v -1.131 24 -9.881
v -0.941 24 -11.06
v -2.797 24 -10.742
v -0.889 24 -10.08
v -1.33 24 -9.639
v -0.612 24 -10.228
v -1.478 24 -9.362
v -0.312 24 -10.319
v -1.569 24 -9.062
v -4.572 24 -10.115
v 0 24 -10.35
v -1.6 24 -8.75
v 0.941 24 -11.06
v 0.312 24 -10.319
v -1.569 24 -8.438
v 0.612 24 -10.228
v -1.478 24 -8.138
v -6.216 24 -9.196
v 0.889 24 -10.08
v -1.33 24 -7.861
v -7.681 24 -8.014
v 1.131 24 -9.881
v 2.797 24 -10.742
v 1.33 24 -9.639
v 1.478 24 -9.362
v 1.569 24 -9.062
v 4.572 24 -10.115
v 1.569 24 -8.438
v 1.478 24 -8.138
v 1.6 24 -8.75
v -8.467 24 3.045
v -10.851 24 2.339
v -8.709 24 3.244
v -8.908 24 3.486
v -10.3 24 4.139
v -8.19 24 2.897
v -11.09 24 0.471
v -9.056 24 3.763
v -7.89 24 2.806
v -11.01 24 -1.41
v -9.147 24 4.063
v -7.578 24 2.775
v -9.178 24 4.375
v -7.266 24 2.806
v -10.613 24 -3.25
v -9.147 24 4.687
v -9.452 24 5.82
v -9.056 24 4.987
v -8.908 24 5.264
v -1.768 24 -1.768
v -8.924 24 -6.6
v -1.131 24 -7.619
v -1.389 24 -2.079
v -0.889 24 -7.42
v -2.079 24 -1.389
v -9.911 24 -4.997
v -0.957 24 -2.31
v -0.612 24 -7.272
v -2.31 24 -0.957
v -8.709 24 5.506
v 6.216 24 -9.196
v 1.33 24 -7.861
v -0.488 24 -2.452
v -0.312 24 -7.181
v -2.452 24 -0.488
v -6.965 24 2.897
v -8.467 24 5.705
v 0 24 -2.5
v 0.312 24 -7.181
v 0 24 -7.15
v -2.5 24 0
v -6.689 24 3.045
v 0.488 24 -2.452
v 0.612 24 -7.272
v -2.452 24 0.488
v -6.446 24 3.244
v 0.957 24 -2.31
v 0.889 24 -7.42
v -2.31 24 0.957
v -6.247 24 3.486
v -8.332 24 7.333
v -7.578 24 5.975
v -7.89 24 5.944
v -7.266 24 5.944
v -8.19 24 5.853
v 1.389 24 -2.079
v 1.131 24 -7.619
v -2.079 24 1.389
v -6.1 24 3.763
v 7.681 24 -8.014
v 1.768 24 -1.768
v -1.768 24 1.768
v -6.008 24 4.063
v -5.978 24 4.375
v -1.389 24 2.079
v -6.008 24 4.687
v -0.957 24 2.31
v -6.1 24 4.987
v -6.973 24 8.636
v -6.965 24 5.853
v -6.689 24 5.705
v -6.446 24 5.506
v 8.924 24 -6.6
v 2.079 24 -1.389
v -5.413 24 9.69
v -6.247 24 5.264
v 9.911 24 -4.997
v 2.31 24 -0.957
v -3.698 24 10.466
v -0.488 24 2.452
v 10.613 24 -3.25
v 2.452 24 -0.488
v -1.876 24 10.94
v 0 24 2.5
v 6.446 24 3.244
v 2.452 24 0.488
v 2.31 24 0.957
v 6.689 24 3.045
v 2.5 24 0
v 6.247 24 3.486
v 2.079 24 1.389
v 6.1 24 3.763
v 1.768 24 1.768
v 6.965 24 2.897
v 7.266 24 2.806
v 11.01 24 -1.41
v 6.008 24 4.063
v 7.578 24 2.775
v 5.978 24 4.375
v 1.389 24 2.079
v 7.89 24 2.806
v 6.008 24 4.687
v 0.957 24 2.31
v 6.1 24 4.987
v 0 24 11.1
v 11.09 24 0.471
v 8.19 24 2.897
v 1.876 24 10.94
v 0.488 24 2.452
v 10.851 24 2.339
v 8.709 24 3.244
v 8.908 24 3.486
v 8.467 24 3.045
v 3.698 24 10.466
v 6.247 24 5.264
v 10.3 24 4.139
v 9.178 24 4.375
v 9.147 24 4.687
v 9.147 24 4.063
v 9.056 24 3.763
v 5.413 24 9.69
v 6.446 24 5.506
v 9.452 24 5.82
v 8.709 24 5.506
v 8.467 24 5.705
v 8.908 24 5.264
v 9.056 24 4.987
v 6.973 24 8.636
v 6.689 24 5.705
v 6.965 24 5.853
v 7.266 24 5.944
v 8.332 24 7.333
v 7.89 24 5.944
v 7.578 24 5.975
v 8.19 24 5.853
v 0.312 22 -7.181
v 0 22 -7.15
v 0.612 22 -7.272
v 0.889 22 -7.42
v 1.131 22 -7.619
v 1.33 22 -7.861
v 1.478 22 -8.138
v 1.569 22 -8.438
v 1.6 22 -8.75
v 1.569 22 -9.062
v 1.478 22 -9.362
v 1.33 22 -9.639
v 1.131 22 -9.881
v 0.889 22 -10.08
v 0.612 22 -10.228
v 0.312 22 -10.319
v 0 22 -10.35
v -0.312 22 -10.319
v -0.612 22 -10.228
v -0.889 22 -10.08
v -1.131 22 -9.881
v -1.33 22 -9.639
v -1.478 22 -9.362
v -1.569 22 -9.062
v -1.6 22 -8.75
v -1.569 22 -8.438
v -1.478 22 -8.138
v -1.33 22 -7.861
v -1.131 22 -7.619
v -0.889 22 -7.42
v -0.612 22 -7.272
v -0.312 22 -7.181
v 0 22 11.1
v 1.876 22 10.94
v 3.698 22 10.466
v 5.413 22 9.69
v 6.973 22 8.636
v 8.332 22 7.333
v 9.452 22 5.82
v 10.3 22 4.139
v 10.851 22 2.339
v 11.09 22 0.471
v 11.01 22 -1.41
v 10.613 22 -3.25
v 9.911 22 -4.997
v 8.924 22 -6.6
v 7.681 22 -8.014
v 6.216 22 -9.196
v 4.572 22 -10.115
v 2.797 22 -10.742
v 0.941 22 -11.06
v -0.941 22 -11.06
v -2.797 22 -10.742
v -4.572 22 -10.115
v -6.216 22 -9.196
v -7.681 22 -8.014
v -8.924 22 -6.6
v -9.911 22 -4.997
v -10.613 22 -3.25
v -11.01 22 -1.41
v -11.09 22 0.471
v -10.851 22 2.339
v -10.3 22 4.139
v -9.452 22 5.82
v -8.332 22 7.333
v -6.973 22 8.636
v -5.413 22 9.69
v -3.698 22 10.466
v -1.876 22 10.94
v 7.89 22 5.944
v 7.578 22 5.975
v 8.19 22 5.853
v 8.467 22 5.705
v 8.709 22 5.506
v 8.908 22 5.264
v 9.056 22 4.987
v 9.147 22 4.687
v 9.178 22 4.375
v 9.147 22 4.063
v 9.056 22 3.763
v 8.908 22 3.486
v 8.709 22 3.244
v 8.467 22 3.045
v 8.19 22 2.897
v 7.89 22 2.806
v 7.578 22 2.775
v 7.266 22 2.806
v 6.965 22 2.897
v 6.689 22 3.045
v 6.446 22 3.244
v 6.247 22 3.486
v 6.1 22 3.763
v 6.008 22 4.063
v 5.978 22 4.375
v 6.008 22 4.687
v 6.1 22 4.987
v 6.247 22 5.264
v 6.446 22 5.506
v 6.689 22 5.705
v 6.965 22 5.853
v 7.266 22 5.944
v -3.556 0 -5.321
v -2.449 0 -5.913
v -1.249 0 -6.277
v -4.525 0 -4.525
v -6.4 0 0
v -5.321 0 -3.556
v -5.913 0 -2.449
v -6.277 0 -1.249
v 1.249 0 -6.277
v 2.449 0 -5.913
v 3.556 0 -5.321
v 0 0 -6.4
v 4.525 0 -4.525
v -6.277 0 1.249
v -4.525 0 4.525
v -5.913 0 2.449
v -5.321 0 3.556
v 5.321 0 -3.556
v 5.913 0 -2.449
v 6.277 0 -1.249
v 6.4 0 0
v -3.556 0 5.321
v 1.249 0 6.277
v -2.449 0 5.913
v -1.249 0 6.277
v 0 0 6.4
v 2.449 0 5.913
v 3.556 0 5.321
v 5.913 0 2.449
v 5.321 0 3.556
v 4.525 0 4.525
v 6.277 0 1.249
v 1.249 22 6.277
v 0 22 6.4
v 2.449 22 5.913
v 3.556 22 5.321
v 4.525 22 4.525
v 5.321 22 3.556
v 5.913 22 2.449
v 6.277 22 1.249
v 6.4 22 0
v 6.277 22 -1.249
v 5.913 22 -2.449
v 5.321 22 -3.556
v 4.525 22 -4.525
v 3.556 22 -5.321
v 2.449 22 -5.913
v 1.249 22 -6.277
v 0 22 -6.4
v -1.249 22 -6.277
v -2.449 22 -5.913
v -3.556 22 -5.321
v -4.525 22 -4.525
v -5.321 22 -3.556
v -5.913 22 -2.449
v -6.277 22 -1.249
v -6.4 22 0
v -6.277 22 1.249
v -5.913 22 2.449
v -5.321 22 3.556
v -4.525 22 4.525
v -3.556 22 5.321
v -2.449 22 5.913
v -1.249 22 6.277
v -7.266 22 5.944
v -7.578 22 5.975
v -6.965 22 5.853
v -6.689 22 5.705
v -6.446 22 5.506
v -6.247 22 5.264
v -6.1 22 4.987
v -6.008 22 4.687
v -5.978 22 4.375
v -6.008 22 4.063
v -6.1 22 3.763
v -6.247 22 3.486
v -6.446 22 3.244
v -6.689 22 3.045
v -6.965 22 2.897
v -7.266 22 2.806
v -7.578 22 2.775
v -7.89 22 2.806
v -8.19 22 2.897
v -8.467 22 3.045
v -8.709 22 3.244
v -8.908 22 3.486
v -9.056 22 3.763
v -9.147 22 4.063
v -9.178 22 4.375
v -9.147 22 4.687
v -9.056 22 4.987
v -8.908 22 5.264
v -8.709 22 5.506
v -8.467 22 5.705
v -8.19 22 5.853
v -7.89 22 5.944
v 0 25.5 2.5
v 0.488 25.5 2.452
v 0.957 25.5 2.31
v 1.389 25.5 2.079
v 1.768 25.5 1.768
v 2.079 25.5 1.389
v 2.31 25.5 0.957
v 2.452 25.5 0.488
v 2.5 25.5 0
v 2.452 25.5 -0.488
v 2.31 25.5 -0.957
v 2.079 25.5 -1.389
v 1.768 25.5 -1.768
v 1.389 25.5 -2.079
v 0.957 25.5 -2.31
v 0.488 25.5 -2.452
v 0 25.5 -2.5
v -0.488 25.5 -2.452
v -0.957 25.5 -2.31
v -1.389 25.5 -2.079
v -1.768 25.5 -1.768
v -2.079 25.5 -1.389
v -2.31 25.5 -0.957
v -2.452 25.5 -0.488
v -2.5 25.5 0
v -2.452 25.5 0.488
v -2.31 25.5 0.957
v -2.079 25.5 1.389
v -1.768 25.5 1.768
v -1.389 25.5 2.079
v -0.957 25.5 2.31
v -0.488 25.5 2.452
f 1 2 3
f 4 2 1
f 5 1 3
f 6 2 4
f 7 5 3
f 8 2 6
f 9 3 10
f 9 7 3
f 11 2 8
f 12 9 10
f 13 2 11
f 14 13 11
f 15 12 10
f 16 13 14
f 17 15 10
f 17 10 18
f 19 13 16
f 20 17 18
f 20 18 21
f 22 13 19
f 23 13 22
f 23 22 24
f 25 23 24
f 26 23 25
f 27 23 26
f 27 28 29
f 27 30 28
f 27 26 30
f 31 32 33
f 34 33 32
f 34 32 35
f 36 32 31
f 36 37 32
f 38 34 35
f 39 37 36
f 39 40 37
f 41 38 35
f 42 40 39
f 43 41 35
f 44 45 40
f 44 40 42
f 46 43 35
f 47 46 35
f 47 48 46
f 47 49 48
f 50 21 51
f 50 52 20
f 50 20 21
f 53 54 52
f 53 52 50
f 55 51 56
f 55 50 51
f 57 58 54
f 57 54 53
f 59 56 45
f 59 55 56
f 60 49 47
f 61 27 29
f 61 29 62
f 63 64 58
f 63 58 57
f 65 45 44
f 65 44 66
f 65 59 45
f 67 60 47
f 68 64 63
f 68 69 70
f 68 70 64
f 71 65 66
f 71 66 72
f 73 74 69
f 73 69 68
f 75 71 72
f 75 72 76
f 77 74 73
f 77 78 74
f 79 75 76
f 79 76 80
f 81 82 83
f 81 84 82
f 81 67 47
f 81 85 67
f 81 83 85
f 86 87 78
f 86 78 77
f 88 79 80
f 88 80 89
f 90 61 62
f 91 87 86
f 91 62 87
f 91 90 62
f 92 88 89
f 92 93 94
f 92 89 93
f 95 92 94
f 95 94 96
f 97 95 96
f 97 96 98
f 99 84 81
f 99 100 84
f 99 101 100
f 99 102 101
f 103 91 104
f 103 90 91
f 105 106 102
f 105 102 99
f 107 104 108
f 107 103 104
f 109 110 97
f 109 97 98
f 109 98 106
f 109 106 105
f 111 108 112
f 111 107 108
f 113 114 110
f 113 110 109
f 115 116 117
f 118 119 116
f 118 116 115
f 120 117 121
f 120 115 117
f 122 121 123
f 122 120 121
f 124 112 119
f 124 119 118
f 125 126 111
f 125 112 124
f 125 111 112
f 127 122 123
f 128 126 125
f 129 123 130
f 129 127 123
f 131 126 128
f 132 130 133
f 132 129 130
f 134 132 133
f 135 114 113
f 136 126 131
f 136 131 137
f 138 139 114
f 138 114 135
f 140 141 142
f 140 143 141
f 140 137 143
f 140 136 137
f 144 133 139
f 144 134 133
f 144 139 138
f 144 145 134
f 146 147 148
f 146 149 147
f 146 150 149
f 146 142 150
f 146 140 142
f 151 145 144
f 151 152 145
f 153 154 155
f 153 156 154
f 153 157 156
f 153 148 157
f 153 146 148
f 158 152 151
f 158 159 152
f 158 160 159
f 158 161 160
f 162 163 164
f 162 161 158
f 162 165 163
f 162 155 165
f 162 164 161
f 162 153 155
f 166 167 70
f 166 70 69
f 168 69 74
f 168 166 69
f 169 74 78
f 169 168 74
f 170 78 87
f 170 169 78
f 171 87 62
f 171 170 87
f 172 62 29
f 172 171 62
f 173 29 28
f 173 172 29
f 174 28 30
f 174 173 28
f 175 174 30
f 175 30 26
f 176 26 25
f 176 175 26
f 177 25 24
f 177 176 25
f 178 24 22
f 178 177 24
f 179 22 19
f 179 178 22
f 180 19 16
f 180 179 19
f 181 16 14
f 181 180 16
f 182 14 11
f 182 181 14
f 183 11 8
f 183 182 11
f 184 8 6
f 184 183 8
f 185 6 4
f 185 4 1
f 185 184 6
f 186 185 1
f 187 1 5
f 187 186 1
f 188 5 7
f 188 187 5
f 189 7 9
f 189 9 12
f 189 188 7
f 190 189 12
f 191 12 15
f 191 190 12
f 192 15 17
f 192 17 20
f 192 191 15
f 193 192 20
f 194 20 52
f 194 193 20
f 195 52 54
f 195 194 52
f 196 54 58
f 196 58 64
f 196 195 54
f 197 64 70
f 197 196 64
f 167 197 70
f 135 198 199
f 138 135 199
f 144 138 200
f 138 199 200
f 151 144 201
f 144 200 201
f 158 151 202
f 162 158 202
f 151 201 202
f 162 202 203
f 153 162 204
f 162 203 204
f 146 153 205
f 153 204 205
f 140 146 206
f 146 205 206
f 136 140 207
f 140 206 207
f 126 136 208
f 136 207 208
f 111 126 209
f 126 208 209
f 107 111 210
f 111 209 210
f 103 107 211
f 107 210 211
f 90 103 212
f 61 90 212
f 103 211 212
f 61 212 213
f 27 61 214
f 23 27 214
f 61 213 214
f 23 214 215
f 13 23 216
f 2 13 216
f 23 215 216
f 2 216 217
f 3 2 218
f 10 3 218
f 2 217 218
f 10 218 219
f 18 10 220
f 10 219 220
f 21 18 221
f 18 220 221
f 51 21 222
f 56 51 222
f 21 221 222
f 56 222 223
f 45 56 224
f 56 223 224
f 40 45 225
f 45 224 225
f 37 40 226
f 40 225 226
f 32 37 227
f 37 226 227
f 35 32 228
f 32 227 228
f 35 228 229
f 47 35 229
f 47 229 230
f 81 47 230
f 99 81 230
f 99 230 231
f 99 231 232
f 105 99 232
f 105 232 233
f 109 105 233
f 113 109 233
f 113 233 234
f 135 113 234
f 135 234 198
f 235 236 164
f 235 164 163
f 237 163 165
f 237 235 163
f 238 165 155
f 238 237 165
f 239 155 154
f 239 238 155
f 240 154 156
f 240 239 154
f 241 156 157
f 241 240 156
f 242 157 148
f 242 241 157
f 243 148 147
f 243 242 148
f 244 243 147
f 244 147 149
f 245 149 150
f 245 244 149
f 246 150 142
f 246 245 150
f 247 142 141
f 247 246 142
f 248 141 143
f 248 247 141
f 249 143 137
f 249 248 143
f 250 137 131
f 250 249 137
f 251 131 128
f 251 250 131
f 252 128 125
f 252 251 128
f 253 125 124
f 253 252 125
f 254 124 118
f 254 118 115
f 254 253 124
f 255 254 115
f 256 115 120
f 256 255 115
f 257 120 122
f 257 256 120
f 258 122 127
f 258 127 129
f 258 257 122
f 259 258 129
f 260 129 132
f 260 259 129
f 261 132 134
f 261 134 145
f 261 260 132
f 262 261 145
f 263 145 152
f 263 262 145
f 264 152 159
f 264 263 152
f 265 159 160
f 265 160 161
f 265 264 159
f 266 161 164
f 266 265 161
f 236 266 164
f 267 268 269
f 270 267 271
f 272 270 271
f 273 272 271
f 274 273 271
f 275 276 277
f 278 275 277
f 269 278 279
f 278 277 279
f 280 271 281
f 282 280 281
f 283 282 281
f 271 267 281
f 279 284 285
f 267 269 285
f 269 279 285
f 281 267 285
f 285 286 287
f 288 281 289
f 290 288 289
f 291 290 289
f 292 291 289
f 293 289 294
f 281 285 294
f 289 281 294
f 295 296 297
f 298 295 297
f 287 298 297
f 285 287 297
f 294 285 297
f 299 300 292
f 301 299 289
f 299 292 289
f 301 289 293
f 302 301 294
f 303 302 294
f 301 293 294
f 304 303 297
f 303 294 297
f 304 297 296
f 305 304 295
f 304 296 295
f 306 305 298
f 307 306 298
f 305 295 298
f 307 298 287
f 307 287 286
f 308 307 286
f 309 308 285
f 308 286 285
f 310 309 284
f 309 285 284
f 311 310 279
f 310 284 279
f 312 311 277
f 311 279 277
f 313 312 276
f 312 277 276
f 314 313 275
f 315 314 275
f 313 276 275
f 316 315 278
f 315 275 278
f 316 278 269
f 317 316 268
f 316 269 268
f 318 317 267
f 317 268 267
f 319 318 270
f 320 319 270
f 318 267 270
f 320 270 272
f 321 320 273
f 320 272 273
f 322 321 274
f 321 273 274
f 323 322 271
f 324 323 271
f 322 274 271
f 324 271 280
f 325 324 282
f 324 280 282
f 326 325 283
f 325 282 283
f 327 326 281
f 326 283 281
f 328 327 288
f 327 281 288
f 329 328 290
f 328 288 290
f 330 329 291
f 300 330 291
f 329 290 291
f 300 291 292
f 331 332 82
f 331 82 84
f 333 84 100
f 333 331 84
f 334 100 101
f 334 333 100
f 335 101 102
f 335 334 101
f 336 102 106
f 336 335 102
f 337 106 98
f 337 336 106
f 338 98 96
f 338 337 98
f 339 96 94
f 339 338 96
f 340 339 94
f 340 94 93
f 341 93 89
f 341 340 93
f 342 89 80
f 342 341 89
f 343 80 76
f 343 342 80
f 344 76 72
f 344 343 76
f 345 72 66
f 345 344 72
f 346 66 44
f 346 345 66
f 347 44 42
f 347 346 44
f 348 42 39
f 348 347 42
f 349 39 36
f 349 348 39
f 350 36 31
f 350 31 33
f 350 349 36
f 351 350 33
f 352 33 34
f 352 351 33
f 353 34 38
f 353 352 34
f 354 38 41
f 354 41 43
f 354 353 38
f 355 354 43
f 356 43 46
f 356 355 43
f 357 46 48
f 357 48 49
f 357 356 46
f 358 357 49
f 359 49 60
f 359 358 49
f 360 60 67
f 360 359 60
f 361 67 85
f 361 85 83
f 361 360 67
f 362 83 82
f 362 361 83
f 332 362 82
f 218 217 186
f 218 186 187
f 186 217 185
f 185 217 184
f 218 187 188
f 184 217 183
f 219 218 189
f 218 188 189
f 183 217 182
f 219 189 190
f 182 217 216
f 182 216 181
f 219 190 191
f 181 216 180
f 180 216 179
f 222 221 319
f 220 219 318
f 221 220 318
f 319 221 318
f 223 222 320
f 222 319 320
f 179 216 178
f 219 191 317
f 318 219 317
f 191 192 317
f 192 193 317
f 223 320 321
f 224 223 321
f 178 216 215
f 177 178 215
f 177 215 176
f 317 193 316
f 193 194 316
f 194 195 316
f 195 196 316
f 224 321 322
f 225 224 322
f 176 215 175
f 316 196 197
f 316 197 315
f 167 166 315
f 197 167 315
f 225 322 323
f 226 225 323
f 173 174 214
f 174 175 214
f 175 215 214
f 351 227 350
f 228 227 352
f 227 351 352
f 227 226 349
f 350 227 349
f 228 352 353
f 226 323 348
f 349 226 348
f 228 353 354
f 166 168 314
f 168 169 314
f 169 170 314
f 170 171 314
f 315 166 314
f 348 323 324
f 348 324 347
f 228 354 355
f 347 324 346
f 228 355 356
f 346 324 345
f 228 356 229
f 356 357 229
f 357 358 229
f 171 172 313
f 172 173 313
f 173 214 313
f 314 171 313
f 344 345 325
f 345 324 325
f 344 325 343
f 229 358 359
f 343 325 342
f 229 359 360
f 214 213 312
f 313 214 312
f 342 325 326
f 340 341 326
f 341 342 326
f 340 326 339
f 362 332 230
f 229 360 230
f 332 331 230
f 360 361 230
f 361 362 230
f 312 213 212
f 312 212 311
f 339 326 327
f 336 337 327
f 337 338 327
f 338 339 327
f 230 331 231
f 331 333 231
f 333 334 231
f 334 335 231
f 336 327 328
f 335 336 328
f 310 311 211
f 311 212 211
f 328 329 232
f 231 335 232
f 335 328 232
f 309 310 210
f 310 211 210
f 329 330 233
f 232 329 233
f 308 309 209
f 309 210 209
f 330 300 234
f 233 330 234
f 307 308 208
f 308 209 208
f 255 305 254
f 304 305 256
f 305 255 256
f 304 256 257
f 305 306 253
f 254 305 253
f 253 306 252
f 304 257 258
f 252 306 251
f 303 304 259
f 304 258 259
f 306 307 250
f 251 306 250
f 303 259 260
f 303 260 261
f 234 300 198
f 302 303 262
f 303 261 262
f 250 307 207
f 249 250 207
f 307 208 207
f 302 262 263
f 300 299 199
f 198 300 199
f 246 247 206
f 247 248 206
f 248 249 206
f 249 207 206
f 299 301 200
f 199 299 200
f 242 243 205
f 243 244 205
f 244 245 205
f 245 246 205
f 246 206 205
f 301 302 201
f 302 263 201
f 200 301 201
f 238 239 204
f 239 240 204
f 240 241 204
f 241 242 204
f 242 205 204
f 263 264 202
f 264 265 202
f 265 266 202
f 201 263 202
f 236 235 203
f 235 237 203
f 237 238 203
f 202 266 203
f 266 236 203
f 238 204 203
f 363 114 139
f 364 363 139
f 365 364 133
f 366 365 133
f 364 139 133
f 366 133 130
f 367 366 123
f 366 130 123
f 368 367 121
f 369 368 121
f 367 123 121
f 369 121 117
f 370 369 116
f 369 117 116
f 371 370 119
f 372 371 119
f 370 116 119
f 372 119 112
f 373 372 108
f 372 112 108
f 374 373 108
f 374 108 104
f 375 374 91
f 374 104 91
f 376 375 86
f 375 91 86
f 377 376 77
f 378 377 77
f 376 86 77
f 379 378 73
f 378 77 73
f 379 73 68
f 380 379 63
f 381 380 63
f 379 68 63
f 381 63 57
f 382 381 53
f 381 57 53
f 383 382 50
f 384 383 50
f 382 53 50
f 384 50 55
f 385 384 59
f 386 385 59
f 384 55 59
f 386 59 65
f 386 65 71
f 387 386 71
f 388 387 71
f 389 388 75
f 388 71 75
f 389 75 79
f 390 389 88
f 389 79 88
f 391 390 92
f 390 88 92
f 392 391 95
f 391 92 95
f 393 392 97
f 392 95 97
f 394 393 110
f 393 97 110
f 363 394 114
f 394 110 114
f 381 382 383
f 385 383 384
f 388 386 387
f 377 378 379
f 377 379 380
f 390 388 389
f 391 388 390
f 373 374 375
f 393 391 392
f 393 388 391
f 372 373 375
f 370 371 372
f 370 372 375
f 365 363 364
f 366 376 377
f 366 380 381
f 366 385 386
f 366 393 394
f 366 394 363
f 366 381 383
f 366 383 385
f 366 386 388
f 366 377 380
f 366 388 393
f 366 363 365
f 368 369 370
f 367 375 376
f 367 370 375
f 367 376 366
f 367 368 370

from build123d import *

# Parameters (mm, degrees)
SKETCH_1_R      = 6.4
EXTRUDE_1_DEPTH = 22
SKETCH_2_R      = 11.1
SKETCH_2_R_2    = 1.6
EXTRUDE_3_DEPTH = 2
SKETCH_3_R      = 2.5
EXTRUDE_4_DEPTH = 1.5


with BuildPart() as part:
    # 草图1 → 凸台-拉伸1 (new body)
    with BuildSketch(Plane(origin=(0, 0, 0), x_dir=(1, 0, 0), z_dir=(0, 1, 0))):
        with Locations(Location((0, 0, 0), (0, 0, 270))):
            Circle(SKETCH_1_R)
    extrude(amount=EXTRUDE_1_DEPTH)

    # 草图2 → 凸台-拉伸3 (add)
    with BuildSketch(Plane(origin=(0, 22, 0), x_dir=(1, 0, 0), z_dir=(0, 1, 0))):
        with Locations(Location((0, 0, 0), (0, 0, 270))):
            Circle(SKETCH_2_R)
        with Locations(Location((0, 8.75, 0), (0, 0, 270))):
            Circle(SKETCH_2_R_2, mode=Mode.SUBTRACT)
        with Locations(Location((7.577722283, -4.375, 0), (0, 0, 270))):
            Circle(SKETCH_2_R_2, mode=Mode.SUBTRACT)
        with Locations(Location((-7.577722283, -4.375, 0), (0, 0, 270))):
            Circle(SKETCH_2_R_2, mode=Mode.SUBTRACT)
    extrude(amount=EXTRUDE_3_DEPTH)

    # 草图3 → 凸台-拉伸4 (add)
    with BuildSketch(Plane(origin=(0, 24, 0), x_dir=(1, 0, 0), z_dir=(0, 1, 0))):
        with Locations(Location((0, 0, 0), (0, 0, 270))):
            Circle(SKETCH_3_R)
    extrude(amount=EXTRUDE_4_DEPTH)


solid = part.part
